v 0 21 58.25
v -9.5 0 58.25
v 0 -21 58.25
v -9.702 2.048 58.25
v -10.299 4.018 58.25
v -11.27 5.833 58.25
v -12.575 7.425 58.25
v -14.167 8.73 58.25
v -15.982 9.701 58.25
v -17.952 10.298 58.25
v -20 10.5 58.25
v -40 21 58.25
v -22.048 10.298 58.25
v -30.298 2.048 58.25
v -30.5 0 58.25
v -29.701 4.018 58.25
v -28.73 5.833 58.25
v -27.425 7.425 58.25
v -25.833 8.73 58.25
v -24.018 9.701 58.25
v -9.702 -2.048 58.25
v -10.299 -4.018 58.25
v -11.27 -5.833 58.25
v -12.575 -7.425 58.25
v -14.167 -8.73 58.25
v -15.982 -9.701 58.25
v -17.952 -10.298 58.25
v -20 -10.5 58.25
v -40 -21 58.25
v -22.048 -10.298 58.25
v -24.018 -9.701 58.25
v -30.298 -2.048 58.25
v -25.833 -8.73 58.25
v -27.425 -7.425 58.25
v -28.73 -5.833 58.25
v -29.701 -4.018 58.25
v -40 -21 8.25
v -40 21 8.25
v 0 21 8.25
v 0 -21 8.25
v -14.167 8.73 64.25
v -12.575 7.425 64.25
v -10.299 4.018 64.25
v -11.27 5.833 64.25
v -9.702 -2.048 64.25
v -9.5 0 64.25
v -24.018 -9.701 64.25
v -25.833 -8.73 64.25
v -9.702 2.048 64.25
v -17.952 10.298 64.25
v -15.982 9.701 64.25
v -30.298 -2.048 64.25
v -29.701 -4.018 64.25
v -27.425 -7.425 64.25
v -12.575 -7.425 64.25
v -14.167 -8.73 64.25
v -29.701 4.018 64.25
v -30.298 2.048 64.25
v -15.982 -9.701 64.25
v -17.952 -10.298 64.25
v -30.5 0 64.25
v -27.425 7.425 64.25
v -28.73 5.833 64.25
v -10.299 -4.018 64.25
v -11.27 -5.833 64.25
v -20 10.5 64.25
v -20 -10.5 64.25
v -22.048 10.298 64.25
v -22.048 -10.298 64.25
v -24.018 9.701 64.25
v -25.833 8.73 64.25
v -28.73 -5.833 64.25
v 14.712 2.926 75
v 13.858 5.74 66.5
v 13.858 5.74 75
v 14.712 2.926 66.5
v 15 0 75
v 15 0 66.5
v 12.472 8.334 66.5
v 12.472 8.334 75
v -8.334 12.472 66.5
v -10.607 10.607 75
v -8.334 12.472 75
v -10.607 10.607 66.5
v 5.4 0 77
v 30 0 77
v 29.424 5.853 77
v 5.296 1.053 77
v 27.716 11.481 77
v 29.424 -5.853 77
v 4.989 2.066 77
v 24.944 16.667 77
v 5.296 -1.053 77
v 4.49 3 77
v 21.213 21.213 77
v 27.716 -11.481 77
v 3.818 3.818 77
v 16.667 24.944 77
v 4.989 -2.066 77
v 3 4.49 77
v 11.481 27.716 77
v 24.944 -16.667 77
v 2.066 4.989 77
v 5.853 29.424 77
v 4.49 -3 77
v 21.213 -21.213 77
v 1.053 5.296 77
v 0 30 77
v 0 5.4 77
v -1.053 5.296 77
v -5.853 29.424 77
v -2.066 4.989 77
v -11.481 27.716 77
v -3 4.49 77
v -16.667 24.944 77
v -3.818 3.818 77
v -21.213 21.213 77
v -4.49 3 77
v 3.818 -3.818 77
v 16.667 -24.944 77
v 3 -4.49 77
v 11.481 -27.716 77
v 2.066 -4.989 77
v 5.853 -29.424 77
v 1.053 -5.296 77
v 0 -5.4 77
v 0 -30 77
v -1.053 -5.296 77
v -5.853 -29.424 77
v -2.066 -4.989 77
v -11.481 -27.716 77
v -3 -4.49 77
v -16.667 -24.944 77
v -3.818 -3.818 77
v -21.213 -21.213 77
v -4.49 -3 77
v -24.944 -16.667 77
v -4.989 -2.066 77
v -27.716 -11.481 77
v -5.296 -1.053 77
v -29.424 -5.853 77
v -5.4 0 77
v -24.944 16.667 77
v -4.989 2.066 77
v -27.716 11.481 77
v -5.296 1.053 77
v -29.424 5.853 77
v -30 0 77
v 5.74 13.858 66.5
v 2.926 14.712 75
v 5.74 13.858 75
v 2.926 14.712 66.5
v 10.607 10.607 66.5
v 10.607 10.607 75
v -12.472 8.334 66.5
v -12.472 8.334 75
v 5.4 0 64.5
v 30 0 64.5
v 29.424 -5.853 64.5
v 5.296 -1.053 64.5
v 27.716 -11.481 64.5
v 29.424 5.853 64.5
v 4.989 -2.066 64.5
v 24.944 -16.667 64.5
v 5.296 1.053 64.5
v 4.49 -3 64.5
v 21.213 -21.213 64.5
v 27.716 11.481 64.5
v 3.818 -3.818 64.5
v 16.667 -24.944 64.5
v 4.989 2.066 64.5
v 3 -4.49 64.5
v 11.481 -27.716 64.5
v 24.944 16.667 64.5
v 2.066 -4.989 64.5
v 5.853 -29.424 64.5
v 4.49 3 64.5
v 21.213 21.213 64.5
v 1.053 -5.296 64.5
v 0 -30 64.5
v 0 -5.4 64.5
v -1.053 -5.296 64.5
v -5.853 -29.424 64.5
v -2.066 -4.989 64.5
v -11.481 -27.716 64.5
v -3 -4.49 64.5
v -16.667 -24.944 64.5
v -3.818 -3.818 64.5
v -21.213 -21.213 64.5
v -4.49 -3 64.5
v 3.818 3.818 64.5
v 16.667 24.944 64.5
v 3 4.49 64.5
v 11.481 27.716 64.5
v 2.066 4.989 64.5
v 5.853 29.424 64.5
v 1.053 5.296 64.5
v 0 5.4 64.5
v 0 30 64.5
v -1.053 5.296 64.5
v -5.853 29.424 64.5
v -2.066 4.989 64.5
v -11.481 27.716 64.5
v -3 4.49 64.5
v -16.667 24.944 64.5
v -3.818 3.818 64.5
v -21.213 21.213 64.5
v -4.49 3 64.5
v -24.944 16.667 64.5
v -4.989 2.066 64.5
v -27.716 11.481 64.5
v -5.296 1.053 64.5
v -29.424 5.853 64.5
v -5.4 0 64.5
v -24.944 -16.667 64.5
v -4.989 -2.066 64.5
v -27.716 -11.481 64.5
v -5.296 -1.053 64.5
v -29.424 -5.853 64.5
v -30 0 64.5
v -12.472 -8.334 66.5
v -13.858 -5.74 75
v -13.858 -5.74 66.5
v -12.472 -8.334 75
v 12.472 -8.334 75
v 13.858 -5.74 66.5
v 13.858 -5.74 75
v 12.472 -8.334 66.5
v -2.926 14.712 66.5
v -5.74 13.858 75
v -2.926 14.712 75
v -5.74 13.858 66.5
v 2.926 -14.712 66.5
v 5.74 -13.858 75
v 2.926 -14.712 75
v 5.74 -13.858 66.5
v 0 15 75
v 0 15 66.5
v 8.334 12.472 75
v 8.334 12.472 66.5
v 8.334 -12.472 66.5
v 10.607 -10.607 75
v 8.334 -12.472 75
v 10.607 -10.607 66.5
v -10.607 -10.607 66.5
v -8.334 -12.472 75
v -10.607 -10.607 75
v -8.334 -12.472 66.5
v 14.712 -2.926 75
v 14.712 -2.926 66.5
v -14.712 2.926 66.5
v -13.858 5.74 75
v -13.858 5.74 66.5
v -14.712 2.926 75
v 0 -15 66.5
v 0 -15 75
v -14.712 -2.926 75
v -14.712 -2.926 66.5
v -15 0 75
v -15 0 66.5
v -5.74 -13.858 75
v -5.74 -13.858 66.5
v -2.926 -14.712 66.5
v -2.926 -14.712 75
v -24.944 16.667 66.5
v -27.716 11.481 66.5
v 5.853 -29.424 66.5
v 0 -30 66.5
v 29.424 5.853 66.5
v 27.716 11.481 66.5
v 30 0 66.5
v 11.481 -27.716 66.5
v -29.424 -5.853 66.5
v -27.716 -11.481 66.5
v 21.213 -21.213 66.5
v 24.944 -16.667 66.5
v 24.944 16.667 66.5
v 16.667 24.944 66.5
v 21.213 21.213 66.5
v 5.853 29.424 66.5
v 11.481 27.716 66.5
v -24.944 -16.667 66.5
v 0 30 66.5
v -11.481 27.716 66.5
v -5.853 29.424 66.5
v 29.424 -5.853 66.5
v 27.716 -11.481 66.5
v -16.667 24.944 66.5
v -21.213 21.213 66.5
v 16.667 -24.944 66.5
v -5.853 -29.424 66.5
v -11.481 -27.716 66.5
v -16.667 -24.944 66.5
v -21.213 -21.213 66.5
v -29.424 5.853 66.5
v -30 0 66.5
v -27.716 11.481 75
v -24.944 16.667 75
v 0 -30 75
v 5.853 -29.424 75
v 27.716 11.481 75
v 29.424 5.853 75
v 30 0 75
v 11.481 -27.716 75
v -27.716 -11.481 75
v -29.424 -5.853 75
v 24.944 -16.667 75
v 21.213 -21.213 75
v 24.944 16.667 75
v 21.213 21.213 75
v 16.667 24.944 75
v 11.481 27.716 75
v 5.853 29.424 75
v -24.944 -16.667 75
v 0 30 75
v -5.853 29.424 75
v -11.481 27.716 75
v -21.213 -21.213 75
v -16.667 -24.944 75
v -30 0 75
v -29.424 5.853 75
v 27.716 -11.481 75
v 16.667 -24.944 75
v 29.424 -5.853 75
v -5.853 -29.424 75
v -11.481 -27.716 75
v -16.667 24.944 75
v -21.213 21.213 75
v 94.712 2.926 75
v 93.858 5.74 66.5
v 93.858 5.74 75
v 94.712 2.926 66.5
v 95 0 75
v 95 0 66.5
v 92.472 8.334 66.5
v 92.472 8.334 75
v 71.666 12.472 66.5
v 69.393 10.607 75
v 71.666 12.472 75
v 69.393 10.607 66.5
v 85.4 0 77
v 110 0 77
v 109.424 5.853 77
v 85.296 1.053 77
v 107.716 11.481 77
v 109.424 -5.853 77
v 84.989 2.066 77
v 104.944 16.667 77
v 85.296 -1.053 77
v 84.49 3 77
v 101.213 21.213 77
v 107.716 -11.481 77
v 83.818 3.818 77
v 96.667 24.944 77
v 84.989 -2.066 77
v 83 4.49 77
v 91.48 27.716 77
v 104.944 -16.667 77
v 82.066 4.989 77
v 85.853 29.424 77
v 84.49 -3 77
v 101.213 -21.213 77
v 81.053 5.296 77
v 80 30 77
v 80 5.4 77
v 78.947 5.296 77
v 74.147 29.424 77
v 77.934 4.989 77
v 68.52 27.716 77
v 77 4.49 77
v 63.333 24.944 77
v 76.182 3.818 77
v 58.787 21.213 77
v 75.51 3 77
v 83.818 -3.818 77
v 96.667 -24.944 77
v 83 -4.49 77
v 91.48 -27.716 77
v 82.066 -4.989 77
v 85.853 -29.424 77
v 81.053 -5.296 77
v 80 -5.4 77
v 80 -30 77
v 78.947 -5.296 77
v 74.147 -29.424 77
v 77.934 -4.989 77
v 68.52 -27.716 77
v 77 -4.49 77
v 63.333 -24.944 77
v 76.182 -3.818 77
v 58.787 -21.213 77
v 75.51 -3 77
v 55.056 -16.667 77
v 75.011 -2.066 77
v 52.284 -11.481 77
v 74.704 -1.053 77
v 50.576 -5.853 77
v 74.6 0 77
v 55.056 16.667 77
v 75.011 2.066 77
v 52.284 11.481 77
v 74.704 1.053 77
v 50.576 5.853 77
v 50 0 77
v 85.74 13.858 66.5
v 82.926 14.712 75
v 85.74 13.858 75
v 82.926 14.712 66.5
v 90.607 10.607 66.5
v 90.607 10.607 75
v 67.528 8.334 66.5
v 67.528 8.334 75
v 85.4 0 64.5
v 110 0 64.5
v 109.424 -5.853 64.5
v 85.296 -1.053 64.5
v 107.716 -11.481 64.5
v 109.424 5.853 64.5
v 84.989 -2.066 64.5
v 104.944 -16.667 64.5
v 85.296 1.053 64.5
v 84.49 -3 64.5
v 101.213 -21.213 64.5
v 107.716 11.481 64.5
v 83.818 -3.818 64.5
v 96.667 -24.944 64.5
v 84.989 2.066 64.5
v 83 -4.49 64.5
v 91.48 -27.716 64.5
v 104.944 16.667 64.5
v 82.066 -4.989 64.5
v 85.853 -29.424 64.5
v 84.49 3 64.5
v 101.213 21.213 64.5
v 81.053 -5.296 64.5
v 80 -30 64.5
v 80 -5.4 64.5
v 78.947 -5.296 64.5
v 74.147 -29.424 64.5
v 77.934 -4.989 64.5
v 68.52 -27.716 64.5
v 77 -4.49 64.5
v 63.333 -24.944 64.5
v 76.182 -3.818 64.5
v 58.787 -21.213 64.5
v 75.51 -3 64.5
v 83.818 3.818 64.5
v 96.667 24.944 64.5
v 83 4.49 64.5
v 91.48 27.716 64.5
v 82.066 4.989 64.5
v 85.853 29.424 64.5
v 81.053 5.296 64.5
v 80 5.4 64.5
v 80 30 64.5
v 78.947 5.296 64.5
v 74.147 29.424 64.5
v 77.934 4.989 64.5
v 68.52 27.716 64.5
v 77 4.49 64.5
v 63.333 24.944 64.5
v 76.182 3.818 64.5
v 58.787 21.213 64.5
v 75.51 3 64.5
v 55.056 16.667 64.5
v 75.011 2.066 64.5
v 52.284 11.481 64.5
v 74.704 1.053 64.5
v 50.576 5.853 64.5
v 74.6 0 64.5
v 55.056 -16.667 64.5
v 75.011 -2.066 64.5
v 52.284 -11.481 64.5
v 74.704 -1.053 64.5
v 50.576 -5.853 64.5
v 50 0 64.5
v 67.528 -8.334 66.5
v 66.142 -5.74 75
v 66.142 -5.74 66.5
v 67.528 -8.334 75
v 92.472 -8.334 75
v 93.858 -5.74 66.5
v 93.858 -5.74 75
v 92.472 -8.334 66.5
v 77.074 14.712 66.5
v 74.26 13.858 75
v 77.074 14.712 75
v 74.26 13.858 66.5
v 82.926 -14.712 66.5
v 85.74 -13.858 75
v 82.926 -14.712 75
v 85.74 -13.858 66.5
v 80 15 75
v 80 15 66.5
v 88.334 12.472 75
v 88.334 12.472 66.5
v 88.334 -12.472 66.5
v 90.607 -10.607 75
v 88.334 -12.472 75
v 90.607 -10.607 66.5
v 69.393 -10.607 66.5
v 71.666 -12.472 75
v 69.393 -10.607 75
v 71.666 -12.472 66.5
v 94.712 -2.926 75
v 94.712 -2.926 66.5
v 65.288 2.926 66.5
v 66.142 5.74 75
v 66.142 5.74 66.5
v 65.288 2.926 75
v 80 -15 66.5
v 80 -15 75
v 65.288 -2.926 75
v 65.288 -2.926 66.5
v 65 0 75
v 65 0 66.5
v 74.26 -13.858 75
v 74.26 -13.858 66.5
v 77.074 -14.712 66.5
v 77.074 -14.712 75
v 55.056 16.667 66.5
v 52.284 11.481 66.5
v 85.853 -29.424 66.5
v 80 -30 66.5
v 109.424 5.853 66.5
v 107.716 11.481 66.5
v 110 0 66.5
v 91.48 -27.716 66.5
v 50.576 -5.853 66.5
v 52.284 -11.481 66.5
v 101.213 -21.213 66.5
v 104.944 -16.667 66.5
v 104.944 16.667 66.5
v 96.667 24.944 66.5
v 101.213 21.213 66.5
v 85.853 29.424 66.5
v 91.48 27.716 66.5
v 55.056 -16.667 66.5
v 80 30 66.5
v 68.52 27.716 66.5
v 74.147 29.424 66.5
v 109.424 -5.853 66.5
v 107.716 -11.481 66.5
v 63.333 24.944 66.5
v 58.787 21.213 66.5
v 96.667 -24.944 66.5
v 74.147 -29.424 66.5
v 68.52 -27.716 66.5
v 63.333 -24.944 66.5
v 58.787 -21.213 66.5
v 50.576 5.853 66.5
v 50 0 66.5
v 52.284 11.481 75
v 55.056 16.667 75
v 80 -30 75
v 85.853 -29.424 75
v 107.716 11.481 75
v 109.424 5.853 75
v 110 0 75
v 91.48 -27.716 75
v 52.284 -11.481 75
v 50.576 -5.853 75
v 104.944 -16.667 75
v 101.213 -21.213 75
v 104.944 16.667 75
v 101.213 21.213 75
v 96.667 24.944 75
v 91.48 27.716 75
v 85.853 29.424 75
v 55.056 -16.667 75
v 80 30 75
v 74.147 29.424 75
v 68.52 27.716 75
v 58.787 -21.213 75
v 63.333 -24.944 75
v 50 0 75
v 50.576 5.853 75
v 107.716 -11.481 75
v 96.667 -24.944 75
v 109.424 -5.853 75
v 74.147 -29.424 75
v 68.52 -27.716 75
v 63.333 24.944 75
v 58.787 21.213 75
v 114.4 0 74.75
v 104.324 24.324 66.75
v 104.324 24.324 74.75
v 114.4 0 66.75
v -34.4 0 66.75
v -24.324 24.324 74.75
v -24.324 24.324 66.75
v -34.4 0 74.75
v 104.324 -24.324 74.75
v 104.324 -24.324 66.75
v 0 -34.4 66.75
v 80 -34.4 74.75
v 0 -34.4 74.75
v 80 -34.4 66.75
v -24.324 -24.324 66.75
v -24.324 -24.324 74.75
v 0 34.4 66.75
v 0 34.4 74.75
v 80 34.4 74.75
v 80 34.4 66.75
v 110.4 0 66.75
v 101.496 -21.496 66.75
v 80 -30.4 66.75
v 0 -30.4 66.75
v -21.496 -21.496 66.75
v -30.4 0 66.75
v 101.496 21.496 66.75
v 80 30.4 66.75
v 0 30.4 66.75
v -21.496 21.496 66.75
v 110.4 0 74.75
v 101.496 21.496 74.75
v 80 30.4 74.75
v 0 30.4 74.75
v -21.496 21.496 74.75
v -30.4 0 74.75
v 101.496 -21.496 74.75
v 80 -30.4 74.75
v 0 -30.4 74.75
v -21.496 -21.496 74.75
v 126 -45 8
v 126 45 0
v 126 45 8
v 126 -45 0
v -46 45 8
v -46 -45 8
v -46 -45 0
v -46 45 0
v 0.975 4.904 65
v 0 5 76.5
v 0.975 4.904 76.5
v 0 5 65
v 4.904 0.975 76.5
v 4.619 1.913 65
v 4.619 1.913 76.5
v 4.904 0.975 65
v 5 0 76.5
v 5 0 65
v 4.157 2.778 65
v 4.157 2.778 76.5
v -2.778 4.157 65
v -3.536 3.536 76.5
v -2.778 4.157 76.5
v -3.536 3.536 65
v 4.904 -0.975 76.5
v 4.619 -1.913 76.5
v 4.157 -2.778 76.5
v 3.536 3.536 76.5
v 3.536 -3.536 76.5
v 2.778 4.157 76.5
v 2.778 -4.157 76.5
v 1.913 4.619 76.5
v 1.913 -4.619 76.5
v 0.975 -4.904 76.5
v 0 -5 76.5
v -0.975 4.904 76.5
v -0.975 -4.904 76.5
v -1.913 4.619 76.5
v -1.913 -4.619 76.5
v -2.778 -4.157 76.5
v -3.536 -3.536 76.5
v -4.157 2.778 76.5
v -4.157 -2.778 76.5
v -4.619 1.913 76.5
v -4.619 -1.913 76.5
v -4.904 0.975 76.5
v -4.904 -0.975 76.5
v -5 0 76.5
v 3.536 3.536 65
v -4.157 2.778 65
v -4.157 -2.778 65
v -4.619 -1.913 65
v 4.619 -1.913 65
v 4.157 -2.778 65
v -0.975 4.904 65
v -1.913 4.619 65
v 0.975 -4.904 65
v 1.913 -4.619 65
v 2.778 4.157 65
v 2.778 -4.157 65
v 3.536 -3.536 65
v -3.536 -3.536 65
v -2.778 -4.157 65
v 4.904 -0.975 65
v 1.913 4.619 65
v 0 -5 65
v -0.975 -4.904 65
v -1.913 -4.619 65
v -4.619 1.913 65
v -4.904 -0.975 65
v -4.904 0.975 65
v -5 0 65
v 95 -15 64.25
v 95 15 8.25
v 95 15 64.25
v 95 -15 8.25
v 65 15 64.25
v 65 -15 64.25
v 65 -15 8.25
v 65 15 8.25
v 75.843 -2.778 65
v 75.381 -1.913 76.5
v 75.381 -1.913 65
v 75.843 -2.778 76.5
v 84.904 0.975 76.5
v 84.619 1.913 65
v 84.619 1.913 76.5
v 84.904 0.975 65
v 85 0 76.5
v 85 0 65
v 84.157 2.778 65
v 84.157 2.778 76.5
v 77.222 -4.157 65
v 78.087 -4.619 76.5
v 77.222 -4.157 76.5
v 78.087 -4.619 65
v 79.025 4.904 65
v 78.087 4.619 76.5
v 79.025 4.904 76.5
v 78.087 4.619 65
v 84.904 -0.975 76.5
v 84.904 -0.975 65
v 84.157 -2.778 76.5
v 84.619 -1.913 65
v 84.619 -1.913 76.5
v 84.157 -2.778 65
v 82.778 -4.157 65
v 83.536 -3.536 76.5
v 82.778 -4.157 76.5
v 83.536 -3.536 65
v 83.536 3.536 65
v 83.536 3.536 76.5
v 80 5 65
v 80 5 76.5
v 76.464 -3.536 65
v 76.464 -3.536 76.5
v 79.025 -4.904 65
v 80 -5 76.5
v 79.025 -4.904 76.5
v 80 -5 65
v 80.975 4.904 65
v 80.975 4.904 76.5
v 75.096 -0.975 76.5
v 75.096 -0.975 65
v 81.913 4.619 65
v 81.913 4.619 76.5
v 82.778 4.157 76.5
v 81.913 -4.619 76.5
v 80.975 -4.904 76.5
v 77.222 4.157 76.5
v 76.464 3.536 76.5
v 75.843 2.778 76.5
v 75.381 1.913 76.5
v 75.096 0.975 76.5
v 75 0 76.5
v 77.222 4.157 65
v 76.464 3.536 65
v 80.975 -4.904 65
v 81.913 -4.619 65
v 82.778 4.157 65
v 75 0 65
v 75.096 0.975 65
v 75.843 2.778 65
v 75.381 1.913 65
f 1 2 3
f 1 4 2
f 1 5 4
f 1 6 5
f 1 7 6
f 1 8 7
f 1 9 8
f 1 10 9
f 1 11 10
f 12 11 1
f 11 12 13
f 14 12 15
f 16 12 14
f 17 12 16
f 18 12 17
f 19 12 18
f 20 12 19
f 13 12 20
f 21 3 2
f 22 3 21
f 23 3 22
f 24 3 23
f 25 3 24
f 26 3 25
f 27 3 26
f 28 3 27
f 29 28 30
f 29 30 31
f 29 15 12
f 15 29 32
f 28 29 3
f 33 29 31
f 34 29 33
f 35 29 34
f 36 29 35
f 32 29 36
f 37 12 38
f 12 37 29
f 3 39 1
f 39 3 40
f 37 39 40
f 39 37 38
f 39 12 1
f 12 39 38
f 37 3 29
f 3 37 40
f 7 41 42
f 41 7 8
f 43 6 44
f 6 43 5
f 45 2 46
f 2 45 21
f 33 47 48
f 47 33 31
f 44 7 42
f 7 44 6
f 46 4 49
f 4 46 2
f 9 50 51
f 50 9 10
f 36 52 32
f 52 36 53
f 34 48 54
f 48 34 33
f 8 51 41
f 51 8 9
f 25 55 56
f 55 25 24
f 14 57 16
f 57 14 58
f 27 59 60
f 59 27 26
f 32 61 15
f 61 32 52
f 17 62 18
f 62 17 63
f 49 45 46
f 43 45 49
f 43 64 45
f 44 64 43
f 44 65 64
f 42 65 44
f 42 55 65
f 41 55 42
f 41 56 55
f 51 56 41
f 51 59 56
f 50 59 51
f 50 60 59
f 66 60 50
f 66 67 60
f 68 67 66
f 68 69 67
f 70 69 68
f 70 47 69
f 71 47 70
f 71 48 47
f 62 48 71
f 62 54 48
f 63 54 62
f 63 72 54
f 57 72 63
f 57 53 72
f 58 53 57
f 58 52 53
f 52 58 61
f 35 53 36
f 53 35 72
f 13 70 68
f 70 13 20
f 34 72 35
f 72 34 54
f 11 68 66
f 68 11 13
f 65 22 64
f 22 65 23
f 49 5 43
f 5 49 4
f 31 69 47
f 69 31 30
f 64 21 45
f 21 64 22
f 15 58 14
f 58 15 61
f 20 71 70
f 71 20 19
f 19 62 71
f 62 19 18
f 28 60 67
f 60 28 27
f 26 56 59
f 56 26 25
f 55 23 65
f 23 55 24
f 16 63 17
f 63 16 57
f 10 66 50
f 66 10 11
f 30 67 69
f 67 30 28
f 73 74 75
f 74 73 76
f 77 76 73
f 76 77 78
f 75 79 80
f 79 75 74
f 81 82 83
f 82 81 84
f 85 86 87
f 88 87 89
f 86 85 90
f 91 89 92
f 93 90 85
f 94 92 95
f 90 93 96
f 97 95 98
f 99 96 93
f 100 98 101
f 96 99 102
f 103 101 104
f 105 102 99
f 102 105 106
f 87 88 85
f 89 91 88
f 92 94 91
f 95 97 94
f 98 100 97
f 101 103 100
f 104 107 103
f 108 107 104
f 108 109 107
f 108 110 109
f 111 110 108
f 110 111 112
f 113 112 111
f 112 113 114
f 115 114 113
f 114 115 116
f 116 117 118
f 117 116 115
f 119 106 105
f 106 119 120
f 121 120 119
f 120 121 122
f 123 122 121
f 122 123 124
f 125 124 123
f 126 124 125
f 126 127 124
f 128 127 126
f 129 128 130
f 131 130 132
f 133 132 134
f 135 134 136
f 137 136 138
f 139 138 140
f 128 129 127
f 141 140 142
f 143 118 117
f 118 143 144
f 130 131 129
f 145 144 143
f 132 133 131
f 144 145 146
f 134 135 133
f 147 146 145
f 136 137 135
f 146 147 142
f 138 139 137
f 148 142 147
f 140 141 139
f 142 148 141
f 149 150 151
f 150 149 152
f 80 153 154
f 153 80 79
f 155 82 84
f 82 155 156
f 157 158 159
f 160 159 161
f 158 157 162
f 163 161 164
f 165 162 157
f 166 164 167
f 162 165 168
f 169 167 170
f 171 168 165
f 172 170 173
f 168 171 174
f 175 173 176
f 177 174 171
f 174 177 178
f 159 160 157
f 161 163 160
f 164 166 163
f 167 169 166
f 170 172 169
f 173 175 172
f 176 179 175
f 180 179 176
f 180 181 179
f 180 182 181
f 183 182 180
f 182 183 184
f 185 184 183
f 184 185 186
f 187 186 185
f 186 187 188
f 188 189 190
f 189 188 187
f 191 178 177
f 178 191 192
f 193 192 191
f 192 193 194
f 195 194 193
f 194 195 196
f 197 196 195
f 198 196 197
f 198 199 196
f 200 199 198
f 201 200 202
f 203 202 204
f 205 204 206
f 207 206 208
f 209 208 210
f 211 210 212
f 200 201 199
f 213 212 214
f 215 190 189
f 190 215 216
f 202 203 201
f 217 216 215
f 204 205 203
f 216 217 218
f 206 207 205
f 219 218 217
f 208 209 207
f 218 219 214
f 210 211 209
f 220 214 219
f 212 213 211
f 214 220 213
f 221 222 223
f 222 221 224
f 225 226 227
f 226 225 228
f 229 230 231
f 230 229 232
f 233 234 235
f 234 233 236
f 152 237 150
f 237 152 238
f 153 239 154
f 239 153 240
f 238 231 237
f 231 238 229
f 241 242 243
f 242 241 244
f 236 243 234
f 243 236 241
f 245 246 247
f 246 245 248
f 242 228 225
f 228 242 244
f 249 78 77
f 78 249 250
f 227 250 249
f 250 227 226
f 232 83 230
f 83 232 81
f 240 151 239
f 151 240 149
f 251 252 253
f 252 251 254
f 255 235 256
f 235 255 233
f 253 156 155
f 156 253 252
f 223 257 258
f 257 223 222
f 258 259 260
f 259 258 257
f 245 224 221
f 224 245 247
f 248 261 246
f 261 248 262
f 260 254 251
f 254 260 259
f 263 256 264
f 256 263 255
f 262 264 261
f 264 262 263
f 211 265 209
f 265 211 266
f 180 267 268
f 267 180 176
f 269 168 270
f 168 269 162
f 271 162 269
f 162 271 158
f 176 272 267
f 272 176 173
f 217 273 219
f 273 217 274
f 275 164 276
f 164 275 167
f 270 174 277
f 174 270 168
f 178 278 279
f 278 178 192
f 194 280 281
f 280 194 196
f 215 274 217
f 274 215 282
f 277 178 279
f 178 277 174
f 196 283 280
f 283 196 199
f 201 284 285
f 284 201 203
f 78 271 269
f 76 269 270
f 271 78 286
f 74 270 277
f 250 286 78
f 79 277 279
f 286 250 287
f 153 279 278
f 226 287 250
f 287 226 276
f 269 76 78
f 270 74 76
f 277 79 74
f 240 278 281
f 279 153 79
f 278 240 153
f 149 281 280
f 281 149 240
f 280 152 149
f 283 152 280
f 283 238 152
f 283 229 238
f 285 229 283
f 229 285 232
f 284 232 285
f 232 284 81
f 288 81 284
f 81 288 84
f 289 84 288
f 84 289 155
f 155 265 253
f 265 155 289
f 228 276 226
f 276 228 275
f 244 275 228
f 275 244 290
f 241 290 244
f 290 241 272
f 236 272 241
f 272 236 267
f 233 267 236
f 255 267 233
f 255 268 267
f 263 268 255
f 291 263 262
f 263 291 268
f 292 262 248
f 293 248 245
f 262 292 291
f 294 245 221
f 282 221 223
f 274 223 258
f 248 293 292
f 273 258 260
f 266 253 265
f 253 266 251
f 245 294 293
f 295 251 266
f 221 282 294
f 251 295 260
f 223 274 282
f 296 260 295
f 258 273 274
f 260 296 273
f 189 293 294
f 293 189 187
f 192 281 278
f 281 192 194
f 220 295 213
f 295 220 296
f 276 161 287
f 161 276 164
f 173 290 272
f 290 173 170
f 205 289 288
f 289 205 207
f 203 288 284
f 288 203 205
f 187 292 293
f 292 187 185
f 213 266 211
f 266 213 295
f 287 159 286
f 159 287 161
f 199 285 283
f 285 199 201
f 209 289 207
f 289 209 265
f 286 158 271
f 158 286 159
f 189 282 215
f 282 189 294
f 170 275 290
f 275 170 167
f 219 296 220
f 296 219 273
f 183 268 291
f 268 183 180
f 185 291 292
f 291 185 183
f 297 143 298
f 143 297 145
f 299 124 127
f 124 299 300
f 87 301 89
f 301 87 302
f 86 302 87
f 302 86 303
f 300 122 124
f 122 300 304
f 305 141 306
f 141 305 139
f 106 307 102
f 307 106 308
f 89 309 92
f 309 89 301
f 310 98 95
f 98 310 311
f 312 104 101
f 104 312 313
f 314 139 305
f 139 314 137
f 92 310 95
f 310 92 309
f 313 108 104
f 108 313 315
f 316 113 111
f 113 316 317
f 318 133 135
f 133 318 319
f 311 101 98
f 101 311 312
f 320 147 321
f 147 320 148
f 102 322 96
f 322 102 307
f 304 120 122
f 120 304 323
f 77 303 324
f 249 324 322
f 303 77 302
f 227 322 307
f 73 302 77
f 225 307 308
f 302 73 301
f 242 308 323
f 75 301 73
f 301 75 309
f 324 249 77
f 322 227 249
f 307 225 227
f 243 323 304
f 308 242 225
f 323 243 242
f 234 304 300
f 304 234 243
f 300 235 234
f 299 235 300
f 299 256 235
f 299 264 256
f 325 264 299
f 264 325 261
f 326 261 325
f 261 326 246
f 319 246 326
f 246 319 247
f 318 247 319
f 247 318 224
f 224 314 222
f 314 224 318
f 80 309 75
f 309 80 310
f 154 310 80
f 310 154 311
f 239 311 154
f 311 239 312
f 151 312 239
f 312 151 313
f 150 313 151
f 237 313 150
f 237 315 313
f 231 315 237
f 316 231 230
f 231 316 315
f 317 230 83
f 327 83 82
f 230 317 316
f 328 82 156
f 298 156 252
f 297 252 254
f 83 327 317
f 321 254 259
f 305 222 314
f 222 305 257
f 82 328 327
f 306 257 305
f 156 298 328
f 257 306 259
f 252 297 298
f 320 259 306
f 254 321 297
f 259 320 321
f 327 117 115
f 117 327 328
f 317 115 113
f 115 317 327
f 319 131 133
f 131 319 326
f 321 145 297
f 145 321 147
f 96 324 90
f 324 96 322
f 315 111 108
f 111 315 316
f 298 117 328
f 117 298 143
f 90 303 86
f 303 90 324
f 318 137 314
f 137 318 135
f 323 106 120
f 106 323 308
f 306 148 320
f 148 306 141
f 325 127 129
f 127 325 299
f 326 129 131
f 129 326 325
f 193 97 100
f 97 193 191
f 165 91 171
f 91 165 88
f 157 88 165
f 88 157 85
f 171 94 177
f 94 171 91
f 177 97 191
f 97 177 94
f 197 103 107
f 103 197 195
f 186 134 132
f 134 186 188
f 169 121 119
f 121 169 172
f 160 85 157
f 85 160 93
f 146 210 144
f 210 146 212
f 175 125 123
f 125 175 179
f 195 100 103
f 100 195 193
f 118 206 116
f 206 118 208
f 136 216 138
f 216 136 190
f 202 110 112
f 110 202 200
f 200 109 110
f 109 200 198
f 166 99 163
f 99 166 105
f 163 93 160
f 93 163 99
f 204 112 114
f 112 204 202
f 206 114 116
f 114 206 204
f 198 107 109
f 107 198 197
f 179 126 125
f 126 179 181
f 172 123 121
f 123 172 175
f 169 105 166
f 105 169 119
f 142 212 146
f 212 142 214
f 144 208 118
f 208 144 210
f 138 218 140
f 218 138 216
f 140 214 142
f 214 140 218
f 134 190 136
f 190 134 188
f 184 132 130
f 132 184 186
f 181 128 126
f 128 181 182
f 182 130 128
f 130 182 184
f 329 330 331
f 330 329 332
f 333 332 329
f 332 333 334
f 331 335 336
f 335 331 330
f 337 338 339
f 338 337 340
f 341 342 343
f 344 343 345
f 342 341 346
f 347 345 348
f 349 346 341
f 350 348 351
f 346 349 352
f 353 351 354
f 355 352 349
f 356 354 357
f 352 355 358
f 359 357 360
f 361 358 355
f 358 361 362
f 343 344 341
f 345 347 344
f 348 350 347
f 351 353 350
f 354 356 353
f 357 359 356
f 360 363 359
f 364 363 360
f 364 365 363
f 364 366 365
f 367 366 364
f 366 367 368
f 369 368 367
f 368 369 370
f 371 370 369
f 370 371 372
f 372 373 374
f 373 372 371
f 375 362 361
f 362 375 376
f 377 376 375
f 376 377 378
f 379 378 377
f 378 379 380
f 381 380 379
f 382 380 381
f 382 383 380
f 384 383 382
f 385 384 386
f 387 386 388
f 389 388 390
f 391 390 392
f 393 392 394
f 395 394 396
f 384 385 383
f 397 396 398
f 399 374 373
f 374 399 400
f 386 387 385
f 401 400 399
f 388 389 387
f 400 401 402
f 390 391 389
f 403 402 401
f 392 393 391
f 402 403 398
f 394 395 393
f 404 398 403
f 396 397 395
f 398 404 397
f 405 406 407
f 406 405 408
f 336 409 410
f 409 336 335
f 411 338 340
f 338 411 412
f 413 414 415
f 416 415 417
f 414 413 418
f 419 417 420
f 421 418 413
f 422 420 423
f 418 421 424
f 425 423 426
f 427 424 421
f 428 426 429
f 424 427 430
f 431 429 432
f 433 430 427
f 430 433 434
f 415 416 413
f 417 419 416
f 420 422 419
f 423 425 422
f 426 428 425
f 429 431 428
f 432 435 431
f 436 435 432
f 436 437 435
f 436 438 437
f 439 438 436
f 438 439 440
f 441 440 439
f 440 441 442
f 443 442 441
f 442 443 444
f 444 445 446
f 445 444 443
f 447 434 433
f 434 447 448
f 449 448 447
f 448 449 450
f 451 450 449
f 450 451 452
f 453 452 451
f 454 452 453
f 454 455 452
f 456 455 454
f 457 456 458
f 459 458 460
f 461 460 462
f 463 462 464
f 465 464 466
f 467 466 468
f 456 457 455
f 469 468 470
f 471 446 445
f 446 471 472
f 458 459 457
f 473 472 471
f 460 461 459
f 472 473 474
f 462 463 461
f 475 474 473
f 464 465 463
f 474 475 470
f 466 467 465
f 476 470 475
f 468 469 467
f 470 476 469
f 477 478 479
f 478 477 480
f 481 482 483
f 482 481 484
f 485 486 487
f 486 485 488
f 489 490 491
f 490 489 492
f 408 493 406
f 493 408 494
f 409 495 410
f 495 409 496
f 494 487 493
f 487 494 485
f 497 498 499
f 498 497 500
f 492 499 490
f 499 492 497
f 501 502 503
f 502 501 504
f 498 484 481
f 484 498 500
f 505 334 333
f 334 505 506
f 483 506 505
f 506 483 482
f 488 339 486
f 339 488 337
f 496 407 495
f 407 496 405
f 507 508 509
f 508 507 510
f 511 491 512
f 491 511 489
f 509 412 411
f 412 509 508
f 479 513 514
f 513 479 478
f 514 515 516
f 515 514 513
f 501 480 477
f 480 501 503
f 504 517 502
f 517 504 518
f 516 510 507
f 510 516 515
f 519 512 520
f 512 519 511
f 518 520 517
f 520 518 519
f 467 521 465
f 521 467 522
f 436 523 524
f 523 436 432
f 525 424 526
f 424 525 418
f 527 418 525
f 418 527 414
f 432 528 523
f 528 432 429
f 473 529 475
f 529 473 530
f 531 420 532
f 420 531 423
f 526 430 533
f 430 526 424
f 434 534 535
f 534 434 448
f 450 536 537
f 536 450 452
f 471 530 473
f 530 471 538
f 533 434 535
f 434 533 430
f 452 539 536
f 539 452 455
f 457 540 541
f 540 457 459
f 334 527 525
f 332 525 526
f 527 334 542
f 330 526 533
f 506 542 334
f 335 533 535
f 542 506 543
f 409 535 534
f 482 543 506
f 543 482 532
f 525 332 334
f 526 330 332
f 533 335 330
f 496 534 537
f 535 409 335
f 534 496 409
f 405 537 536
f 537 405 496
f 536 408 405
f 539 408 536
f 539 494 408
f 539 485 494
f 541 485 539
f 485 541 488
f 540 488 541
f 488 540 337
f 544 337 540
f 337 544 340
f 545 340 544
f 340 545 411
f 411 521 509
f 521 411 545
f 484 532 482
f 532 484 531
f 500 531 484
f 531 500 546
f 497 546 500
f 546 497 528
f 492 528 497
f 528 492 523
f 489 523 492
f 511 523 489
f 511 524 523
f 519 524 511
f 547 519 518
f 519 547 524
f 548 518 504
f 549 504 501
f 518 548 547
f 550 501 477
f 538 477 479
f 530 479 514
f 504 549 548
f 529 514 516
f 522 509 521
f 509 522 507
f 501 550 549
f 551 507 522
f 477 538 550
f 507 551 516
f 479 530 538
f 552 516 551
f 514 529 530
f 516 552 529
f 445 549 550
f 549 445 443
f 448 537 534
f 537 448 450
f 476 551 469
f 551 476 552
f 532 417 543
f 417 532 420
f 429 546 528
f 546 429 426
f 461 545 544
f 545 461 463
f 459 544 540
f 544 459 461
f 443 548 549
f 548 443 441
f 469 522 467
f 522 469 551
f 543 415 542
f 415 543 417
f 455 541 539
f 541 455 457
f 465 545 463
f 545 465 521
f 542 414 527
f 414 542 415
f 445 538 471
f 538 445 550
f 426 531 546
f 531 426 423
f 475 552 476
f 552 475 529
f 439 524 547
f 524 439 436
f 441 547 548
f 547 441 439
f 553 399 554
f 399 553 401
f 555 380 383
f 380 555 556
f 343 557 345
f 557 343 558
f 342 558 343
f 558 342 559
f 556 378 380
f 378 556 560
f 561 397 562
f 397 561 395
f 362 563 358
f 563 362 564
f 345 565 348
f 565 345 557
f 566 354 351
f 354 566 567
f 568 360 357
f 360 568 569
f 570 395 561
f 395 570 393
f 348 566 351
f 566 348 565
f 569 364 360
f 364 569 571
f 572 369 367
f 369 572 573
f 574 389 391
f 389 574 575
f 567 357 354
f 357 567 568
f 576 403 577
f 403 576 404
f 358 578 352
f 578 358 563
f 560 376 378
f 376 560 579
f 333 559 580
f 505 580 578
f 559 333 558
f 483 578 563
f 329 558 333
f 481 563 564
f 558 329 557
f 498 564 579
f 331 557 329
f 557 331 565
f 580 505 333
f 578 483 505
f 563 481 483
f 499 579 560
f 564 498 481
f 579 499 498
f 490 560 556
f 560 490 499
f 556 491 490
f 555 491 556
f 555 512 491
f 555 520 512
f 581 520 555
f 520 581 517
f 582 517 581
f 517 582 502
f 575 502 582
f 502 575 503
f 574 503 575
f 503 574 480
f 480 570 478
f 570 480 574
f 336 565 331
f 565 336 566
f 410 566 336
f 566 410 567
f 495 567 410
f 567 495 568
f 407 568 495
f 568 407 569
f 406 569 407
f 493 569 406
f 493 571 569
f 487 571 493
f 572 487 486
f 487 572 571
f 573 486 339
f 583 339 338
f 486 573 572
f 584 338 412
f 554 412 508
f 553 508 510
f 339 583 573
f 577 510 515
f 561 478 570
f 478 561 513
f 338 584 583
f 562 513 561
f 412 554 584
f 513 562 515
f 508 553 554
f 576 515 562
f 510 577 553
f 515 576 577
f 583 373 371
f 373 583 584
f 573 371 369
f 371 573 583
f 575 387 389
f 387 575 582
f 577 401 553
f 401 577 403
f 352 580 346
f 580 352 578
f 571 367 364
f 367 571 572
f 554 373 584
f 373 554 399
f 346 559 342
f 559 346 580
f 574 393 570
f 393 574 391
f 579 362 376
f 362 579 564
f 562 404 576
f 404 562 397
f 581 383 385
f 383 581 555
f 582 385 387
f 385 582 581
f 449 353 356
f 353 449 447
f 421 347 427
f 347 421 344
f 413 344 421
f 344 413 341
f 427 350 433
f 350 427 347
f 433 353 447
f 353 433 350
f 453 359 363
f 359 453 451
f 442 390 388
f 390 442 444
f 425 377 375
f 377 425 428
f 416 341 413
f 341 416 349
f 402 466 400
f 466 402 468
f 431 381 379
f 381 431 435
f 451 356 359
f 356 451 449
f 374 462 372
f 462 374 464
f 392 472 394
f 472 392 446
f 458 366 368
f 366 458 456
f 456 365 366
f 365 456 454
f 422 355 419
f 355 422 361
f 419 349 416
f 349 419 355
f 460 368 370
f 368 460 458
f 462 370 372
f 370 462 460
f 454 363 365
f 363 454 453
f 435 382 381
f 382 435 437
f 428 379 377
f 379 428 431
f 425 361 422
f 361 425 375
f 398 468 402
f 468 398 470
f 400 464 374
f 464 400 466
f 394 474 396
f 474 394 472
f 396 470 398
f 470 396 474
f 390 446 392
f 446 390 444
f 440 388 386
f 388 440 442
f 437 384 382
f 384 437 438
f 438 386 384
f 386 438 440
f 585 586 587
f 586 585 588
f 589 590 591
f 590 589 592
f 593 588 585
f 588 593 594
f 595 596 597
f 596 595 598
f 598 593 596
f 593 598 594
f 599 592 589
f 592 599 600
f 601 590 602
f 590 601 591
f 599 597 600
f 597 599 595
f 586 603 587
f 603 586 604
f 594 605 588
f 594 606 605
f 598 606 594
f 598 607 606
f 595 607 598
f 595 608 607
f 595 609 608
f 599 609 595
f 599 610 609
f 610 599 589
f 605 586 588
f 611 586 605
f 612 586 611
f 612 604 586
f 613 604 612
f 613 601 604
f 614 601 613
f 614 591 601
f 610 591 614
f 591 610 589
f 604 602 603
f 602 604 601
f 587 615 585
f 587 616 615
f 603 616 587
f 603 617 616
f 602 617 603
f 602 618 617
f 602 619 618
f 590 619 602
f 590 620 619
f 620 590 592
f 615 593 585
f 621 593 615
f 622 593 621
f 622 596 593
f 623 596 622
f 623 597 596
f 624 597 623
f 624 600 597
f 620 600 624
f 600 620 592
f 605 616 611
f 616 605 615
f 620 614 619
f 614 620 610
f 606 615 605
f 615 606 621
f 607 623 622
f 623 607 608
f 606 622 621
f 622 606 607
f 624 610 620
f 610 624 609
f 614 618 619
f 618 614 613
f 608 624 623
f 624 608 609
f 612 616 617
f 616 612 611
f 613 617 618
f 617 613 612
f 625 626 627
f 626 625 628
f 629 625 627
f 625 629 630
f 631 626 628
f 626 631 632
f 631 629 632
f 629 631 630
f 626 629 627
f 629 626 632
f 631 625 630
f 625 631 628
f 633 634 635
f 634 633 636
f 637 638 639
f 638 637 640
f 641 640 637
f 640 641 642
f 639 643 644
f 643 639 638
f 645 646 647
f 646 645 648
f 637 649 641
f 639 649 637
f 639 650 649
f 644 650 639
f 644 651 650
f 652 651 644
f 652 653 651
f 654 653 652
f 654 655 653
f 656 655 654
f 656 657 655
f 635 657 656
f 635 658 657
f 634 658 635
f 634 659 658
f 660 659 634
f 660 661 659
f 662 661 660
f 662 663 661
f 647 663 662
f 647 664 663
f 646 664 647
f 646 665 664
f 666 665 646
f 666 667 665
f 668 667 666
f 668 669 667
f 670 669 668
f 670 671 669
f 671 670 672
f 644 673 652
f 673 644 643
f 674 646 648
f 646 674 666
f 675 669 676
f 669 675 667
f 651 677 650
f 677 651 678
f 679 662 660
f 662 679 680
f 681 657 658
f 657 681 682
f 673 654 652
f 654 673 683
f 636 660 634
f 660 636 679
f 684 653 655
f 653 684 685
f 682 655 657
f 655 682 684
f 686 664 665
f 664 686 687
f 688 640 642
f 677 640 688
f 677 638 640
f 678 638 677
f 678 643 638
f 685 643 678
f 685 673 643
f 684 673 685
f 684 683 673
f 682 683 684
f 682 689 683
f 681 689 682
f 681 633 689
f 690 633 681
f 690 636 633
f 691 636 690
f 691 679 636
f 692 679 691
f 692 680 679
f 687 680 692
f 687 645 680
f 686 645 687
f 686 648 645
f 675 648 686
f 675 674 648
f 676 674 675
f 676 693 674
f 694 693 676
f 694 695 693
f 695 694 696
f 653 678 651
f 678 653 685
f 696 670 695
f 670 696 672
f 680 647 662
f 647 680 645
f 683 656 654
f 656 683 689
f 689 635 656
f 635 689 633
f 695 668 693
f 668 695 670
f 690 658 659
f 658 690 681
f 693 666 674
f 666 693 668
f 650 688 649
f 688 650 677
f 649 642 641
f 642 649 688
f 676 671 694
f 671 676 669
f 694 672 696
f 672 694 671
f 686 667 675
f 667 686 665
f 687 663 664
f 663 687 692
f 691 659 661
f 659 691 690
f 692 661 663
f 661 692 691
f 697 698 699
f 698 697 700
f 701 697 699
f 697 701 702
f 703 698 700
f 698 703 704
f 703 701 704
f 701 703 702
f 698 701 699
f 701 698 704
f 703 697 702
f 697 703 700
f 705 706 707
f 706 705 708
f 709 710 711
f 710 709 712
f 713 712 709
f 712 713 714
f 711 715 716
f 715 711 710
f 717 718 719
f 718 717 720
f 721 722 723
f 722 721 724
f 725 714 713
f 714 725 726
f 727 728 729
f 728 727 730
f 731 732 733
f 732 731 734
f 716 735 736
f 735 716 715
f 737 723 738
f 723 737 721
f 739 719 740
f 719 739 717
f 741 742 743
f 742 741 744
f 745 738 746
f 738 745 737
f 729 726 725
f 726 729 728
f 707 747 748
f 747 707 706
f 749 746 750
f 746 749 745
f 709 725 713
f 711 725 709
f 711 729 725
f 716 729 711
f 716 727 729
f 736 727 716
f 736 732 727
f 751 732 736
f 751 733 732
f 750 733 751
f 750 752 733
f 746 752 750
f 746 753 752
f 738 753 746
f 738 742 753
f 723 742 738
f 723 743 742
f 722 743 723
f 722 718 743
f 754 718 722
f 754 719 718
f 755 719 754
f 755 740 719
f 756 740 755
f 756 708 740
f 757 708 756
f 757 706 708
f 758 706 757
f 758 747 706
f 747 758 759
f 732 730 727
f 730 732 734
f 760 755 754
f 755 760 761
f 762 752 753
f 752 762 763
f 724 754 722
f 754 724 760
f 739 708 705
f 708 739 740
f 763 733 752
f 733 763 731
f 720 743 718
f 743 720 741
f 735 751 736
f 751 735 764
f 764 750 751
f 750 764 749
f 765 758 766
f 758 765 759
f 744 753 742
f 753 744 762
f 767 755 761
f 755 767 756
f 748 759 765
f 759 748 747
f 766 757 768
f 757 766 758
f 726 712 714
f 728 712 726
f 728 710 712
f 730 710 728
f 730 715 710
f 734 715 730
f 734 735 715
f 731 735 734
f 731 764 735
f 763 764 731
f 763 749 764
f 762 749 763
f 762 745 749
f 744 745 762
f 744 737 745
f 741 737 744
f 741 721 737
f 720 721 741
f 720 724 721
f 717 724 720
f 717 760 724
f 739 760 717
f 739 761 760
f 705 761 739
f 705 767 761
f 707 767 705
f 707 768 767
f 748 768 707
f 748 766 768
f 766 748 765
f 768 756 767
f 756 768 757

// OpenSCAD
$fn = 32;

// ------------------------------------------------------------------------
// Motor belt drive: span 80 mm, pulleys d60, belt 8 mm wide
// Every part is its own module, assembly() places every instance.
// ------------------------------------------------------------------------

// --- part 1 ---
module base_plate() {
  difference() {
    translate([-86, -45, 0]) cube([172, 90, 8]);
  }
}

// --- part 2 ---
module motor() {
  union() {
    translate([-25, -21, 0]) cube([50, 42, 40]);
    translate([28, 0, 20]) rotate([0, 90, 0]) cylinder(h = 6, d = 21, center = true);
  }
}

// --- part 3 ---
module drive_shaft() {
  translate([0, 0, -5.75]) cylinder(h = 11.5, d = 10);
}

// --- part 4 ---
module pulley_drive() {
  difference() {
    union() {
      cylinder(h = 12.5, d = 30);
      cylinder(h = 2, d = 60);
      translate([0, 0, 10.5]) cylinder(h = 2, d = 60);
    }
    translate([0, 0, -1]) cylinder(h = 14.5, d = 10.8);
  }
}

// --- part 5 ---
module idler_post() {
  translate([-15, -15, 0]) cube([30, 30, 56]);
}

// --- part 6 ---
module driven_shaft() {
  translate([0, 0, -5.75]) cylinder(h = 11.5, d = 10);
}

// --- part 7 ---
module pulley_driven() {
  difference() {
    union() {
      cylinder(h = 12.5, d = 30);
      cylinder(h = 2, d = 60);
      translate([0, 0, 10.5]) cylinder(h = 2, d = 60);
    }
    translate([0, 0, -1]) cylinder(h = 14.5, d = 10.8);
  }
}

// --- part 8 ---
module drive_belt() {
  difference() {
    linear_extrude(height = 8) polygon(points = concat([for (a = [90 : 45 : 270]) [34.4 * cos(a), 34.4 * sin(a)]], [for (a = [270 : 45 : 450]) [80 + 34.4 * cos(a), 34.4 * sin(a)]]));
    translate([0, 0, -1]) linear_extrude(height = 10) polygon(points = concat([for (a = [90 : 45 : 270]) [30.4 * cos(a), 30.4 * sin(a)]], [for (a = [270 : 45 : 450]) [80 + 30.4 * cos(a), 30.4 * sin(a)]]));
  }
}

// --- assembly ---
module assembly() {
  color([0.80, 0.24, 0.20]) translate([40, 0, 0]) rotate([0, 0, 0]) base_plate();
  color([0.20, 0.45, 0.75]) translate([0, 0, 33.25]) rotate([0, 270, 0]) motor();
  color([0.25, 0.62, 0.32]) translate([0, 0, 70.75]) rotate([0, 0, 0]) drive_shaft();
  color([0.92, 0.70, 0.18]) translate([0, 0, 64.5]) rotate([0, 0, 0]) pulley_drive();
  color([0.58, 0.35, 0.70]) translate([80, 0, 8.25]) rotate([0, 0, 0]) idler_post();
  color([0.16, 0.66, 0.66]) translate([80, 0, 70.75]) rotate([0, 0, 0]) driven_shaft();
  color([0.85, 0.48, 0.18]) translate([80, 0, 64.5]) rotate([0, 0, 0]) pulley_driven();
  color([0.55, 0.60, 0.65]) translate([0, 0, 66.75]) rotate([0, 0, 0]) drive_belt();
}

assembly();
